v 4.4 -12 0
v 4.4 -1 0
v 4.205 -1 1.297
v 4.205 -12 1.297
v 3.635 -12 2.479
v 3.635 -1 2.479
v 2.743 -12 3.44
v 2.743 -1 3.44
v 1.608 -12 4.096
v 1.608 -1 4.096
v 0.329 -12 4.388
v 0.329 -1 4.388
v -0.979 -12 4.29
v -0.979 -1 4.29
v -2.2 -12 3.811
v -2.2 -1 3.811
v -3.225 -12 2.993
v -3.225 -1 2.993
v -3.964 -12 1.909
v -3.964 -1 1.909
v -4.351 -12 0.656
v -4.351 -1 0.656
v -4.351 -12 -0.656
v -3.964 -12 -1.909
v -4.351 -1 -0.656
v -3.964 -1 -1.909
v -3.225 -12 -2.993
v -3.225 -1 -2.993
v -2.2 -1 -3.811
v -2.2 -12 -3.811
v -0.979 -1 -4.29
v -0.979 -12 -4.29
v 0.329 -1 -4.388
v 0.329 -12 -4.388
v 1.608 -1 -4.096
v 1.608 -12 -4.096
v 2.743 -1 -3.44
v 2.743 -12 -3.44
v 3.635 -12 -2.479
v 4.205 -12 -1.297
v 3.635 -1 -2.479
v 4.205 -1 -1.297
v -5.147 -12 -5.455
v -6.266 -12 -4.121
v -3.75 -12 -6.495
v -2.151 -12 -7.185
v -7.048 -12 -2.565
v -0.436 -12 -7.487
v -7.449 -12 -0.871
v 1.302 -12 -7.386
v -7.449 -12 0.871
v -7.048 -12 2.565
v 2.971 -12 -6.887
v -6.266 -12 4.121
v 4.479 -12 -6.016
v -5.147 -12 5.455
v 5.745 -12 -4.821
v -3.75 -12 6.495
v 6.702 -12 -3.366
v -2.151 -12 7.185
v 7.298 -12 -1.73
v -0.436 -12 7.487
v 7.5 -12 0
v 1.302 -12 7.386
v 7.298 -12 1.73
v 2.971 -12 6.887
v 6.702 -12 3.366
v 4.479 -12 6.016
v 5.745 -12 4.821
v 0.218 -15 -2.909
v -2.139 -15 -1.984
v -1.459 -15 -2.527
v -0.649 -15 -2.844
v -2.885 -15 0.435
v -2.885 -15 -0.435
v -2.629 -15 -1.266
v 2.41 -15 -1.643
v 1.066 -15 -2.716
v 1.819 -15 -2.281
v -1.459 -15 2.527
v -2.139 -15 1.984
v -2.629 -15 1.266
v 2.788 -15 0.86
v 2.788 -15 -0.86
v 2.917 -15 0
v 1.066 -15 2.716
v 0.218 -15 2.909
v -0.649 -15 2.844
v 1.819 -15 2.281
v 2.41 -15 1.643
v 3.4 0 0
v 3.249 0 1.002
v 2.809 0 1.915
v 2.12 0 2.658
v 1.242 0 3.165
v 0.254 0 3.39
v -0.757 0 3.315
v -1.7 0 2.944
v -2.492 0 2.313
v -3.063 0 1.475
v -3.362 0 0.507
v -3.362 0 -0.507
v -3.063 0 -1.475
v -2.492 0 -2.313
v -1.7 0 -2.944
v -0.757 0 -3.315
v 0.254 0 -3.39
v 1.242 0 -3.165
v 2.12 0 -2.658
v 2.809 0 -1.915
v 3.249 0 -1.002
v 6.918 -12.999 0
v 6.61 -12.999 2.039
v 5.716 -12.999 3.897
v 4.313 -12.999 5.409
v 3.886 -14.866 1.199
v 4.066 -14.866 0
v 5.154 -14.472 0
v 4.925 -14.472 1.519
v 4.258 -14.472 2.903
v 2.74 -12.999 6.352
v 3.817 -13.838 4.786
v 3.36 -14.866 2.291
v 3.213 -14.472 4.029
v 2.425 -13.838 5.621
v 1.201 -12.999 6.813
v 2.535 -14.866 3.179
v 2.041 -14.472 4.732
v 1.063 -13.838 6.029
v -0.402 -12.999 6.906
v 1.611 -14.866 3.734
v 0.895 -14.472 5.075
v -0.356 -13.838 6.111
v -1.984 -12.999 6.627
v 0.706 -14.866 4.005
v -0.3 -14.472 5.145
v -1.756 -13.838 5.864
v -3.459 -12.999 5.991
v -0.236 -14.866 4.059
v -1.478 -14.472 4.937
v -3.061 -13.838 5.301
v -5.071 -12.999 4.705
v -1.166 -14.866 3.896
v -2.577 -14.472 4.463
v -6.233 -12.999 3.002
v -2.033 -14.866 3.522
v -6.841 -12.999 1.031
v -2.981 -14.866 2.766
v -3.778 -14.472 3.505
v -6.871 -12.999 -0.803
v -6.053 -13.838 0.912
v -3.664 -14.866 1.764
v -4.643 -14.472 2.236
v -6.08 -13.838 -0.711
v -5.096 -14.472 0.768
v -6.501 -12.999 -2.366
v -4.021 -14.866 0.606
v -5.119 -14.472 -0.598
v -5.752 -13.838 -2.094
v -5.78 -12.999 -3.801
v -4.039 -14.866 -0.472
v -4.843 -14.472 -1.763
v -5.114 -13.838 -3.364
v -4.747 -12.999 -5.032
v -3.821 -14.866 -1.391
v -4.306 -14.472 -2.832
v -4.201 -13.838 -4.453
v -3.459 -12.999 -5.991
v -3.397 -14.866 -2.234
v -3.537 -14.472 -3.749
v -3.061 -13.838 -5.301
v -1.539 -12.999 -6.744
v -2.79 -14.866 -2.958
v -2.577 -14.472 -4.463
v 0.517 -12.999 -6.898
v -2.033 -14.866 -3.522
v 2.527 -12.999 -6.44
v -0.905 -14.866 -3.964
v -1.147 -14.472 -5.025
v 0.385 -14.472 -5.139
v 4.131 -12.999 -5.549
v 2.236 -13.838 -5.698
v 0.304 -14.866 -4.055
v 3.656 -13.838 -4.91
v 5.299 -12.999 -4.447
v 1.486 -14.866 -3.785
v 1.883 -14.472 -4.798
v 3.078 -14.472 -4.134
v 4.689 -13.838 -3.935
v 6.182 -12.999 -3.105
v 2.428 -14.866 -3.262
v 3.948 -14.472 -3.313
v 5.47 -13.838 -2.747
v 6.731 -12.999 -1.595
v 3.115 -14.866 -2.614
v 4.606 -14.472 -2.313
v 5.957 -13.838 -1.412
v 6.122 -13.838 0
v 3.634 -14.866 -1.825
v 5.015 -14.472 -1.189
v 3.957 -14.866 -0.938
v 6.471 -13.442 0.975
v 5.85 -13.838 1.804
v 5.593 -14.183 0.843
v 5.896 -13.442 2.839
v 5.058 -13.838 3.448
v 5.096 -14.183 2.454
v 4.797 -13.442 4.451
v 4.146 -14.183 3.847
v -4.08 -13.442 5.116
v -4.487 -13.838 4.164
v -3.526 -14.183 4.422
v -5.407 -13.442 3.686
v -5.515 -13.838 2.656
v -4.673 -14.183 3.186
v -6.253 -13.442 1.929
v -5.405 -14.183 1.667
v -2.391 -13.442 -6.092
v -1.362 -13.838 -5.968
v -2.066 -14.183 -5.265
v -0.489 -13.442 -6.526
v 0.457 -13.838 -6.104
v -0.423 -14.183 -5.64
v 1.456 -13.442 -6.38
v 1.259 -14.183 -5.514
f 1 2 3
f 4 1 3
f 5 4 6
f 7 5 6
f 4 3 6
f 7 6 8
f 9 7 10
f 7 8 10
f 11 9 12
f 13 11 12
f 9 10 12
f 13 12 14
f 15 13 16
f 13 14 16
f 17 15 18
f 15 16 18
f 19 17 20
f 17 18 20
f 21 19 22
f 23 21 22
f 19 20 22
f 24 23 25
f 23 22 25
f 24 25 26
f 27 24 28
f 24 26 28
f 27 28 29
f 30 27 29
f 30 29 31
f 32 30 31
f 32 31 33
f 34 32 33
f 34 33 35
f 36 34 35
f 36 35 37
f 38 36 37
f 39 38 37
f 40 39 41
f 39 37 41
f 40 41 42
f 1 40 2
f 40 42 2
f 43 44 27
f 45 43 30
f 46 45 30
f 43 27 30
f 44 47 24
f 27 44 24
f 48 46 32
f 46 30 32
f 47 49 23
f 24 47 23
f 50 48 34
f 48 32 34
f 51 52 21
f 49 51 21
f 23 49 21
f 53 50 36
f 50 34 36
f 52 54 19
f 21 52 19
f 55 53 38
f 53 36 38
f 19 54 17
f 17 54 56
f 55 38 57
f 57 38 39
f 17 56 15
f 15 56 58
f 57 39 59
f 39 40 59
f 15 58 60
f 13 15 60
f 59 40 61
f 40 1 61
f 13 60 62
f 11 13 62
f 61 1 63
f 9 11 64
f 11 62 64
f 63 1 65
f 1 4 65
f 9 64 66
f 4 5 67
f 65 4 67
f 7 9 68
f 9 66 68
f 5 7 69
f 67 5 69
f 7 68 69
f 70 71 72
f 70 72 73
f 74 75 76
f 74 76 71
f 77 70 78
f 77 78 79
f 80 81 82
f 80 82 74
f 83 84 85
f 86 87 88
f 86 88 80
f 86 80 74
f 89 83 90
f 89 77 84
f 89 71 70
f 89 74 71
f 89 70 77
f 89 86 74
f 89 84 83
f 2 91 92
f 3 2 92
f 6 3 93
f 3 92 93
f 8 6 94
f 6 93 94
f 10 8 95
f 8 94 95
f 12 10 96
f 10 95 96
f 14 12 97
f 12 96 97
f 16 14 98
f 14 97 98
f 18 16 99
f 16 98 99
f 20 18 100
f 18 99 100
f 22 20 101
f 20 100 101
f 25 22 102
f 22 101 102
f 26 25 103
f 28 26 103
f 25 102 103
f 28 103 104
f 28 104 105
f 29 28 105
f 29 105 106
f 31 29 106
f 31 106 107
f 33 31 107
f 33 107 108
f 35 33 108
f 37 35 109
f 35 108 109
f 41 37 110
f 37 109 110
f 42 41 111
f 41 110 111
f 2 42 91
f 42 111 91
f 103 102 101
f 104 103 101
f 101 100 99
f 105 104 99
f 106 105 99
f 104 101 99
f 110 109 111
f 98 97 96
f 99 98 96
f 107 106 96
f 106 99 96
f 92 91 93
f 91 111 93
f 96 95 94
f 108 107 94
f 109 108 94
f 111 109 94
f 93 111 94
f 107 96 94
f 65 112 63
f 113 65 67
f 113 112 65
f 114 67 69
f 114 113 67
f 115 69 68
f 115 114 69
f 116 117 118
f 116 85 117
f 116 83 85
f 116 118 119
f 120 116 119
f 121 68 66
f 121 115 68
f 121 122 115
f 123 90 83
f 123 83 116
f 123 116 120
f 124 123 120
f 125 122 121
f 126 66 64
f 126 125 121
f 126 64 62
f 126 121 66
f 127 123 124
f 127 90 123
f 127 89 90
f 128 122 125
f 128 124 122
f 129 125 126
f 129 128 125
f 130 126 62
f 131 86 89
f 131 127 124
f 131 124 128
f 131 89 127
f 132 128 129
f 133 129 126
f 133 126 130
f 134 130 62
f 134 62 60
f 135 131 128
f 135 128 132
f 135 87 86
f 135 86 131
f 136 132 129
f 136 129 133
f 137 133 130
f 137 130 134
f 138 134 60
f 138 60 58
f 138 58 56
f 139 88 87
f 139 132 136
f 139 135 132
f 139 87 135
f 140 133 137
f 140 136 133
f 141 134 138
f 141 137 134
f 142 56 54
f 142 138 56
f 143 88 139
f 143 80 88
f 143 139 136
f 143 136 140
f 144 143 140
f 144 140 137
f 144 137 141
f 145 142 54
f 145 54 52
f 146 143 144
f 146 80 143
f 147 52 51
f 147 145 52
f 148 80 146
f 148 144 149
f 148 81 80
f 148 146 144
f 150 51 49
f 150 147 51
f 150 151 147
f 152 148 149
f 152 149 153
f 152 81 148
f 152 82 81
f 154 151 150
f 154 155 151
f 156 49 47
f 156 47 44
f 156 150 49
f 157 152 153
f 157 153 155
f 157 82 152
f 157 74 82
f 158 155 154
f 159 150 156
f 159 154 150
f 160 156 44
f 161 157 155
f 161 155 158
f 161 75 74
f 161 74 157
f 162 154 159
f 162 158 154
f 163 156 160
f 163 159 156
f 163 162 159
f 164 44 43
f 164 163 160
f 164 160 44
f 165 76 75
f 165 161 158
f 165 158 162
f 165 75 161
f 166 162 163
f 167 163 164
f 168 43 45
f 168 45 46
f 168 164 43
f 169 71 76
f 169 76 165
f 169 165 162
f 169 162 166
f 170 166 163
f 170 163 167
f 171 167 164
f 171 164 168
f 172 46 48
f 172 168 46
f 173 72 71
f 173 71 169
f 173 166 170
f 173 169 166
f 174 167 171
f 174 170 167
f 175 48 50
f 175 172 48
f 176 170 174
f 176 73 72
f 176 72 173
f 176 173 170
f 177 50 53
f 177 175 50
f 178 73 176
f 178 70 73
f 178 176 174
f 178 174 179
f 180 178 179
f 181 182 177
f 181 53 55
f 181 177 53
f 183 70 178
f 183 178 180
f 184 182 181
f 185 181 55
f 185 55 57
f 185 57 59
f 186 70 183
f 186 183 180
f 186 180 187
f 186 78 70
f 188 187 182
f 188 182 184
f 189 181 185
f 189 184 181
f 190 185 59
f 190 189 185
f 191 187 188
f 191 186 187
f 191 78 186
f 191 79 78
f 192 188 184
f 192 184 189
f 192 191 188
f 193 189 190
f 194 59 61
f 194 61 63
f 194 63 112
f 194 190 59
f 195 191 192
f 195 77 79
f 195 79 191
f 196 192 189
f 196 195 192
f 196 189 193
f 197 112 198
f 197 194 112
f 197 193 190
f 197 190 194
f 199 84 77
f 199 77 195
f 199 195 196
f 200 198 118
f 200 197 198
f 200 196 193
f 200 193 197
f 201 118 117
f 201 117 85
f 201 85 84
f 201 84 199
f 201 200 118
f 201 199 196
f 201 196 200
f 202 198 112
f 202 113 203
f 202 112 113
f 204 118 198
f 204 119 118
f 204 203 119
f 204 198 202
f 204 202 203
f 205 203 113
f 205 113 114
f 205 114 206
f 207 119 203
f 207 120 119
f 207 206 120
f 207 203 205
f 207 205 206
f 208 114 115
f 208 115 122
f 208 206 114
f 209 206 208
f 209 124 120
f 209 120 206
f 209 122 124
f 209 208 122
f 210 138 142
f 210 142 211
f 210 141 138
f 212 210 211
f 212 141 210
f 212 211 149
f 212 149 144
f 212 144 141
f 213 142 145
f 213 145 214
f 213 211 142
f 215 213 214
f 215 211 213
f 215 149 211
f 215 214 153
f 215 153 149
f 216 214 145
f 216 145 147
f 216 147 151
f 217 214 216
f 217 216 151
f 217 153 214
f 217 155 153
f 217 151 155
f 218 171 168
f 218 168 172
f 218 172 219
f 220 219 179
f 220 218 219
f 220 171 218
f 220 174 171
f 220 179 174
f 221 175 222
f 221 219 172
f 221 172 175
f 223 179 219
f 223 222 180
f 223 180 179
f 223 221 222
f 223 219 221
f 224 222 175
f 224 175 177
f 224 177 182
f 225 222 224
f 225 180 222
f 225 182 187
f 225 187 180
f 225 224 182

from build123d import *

# Parameters (mm, degrees)
F0_R     = 4.4
F1_DEPTH = 12
F2_R     = 7.5
F2_R_2   = 4.4
F3_DEPTH = 3
F5_SIZE  = 1


# Not quite as in the source:
# - a fillet or chamfer that OpenCascade refuses, or shapes differently, is made with other operations: its cross-section is extruded or revolved along the edge and cut away or added


with BuildPart() as f1:
    # F0 (on Front) → F1 (new body)
    with BuildSketch(Plane.XZ):
        Circle(F0_R)
    extrude(amount=F1_DEPTH)

    # F2 (on face) → F3 (join)
    with BuildSketch(Plane.XZ.offset(12)):
        Circle(F2_R)
        Circle(F2_R_2, mode=Mode.SUBTRACT)
        Circle(F2_R)
    extrude(amount=F3_DEPTH)

    # F4: fillet of radius 5 on 1 edges, made by hand

    # F4_s1 → F4_t2 (revolve, cut)
    with BuildSketch(Plane.XY):
        with BuildLine():
            ThreePointArc((7.5, -12), (5.6560370926, -14.1833001327), (2.917424305, -15))
            Line((2.917424305, -15), (7.5, -15))
            Line((7.5, -15), (7.5, -12))
        make_face()
    revolve(axis=Axis((0, -15, 0), (0, -1, 0)), mode=Mode.SUBTRACT)

    # F5
    f5_edges = [f1.edges().sort_by_distance(p)[0] for p in [
        (-4.4, 0, 0),
    ]]
    chamfer(f5_edges, length=F5_SIZE)


solid = f1.part
